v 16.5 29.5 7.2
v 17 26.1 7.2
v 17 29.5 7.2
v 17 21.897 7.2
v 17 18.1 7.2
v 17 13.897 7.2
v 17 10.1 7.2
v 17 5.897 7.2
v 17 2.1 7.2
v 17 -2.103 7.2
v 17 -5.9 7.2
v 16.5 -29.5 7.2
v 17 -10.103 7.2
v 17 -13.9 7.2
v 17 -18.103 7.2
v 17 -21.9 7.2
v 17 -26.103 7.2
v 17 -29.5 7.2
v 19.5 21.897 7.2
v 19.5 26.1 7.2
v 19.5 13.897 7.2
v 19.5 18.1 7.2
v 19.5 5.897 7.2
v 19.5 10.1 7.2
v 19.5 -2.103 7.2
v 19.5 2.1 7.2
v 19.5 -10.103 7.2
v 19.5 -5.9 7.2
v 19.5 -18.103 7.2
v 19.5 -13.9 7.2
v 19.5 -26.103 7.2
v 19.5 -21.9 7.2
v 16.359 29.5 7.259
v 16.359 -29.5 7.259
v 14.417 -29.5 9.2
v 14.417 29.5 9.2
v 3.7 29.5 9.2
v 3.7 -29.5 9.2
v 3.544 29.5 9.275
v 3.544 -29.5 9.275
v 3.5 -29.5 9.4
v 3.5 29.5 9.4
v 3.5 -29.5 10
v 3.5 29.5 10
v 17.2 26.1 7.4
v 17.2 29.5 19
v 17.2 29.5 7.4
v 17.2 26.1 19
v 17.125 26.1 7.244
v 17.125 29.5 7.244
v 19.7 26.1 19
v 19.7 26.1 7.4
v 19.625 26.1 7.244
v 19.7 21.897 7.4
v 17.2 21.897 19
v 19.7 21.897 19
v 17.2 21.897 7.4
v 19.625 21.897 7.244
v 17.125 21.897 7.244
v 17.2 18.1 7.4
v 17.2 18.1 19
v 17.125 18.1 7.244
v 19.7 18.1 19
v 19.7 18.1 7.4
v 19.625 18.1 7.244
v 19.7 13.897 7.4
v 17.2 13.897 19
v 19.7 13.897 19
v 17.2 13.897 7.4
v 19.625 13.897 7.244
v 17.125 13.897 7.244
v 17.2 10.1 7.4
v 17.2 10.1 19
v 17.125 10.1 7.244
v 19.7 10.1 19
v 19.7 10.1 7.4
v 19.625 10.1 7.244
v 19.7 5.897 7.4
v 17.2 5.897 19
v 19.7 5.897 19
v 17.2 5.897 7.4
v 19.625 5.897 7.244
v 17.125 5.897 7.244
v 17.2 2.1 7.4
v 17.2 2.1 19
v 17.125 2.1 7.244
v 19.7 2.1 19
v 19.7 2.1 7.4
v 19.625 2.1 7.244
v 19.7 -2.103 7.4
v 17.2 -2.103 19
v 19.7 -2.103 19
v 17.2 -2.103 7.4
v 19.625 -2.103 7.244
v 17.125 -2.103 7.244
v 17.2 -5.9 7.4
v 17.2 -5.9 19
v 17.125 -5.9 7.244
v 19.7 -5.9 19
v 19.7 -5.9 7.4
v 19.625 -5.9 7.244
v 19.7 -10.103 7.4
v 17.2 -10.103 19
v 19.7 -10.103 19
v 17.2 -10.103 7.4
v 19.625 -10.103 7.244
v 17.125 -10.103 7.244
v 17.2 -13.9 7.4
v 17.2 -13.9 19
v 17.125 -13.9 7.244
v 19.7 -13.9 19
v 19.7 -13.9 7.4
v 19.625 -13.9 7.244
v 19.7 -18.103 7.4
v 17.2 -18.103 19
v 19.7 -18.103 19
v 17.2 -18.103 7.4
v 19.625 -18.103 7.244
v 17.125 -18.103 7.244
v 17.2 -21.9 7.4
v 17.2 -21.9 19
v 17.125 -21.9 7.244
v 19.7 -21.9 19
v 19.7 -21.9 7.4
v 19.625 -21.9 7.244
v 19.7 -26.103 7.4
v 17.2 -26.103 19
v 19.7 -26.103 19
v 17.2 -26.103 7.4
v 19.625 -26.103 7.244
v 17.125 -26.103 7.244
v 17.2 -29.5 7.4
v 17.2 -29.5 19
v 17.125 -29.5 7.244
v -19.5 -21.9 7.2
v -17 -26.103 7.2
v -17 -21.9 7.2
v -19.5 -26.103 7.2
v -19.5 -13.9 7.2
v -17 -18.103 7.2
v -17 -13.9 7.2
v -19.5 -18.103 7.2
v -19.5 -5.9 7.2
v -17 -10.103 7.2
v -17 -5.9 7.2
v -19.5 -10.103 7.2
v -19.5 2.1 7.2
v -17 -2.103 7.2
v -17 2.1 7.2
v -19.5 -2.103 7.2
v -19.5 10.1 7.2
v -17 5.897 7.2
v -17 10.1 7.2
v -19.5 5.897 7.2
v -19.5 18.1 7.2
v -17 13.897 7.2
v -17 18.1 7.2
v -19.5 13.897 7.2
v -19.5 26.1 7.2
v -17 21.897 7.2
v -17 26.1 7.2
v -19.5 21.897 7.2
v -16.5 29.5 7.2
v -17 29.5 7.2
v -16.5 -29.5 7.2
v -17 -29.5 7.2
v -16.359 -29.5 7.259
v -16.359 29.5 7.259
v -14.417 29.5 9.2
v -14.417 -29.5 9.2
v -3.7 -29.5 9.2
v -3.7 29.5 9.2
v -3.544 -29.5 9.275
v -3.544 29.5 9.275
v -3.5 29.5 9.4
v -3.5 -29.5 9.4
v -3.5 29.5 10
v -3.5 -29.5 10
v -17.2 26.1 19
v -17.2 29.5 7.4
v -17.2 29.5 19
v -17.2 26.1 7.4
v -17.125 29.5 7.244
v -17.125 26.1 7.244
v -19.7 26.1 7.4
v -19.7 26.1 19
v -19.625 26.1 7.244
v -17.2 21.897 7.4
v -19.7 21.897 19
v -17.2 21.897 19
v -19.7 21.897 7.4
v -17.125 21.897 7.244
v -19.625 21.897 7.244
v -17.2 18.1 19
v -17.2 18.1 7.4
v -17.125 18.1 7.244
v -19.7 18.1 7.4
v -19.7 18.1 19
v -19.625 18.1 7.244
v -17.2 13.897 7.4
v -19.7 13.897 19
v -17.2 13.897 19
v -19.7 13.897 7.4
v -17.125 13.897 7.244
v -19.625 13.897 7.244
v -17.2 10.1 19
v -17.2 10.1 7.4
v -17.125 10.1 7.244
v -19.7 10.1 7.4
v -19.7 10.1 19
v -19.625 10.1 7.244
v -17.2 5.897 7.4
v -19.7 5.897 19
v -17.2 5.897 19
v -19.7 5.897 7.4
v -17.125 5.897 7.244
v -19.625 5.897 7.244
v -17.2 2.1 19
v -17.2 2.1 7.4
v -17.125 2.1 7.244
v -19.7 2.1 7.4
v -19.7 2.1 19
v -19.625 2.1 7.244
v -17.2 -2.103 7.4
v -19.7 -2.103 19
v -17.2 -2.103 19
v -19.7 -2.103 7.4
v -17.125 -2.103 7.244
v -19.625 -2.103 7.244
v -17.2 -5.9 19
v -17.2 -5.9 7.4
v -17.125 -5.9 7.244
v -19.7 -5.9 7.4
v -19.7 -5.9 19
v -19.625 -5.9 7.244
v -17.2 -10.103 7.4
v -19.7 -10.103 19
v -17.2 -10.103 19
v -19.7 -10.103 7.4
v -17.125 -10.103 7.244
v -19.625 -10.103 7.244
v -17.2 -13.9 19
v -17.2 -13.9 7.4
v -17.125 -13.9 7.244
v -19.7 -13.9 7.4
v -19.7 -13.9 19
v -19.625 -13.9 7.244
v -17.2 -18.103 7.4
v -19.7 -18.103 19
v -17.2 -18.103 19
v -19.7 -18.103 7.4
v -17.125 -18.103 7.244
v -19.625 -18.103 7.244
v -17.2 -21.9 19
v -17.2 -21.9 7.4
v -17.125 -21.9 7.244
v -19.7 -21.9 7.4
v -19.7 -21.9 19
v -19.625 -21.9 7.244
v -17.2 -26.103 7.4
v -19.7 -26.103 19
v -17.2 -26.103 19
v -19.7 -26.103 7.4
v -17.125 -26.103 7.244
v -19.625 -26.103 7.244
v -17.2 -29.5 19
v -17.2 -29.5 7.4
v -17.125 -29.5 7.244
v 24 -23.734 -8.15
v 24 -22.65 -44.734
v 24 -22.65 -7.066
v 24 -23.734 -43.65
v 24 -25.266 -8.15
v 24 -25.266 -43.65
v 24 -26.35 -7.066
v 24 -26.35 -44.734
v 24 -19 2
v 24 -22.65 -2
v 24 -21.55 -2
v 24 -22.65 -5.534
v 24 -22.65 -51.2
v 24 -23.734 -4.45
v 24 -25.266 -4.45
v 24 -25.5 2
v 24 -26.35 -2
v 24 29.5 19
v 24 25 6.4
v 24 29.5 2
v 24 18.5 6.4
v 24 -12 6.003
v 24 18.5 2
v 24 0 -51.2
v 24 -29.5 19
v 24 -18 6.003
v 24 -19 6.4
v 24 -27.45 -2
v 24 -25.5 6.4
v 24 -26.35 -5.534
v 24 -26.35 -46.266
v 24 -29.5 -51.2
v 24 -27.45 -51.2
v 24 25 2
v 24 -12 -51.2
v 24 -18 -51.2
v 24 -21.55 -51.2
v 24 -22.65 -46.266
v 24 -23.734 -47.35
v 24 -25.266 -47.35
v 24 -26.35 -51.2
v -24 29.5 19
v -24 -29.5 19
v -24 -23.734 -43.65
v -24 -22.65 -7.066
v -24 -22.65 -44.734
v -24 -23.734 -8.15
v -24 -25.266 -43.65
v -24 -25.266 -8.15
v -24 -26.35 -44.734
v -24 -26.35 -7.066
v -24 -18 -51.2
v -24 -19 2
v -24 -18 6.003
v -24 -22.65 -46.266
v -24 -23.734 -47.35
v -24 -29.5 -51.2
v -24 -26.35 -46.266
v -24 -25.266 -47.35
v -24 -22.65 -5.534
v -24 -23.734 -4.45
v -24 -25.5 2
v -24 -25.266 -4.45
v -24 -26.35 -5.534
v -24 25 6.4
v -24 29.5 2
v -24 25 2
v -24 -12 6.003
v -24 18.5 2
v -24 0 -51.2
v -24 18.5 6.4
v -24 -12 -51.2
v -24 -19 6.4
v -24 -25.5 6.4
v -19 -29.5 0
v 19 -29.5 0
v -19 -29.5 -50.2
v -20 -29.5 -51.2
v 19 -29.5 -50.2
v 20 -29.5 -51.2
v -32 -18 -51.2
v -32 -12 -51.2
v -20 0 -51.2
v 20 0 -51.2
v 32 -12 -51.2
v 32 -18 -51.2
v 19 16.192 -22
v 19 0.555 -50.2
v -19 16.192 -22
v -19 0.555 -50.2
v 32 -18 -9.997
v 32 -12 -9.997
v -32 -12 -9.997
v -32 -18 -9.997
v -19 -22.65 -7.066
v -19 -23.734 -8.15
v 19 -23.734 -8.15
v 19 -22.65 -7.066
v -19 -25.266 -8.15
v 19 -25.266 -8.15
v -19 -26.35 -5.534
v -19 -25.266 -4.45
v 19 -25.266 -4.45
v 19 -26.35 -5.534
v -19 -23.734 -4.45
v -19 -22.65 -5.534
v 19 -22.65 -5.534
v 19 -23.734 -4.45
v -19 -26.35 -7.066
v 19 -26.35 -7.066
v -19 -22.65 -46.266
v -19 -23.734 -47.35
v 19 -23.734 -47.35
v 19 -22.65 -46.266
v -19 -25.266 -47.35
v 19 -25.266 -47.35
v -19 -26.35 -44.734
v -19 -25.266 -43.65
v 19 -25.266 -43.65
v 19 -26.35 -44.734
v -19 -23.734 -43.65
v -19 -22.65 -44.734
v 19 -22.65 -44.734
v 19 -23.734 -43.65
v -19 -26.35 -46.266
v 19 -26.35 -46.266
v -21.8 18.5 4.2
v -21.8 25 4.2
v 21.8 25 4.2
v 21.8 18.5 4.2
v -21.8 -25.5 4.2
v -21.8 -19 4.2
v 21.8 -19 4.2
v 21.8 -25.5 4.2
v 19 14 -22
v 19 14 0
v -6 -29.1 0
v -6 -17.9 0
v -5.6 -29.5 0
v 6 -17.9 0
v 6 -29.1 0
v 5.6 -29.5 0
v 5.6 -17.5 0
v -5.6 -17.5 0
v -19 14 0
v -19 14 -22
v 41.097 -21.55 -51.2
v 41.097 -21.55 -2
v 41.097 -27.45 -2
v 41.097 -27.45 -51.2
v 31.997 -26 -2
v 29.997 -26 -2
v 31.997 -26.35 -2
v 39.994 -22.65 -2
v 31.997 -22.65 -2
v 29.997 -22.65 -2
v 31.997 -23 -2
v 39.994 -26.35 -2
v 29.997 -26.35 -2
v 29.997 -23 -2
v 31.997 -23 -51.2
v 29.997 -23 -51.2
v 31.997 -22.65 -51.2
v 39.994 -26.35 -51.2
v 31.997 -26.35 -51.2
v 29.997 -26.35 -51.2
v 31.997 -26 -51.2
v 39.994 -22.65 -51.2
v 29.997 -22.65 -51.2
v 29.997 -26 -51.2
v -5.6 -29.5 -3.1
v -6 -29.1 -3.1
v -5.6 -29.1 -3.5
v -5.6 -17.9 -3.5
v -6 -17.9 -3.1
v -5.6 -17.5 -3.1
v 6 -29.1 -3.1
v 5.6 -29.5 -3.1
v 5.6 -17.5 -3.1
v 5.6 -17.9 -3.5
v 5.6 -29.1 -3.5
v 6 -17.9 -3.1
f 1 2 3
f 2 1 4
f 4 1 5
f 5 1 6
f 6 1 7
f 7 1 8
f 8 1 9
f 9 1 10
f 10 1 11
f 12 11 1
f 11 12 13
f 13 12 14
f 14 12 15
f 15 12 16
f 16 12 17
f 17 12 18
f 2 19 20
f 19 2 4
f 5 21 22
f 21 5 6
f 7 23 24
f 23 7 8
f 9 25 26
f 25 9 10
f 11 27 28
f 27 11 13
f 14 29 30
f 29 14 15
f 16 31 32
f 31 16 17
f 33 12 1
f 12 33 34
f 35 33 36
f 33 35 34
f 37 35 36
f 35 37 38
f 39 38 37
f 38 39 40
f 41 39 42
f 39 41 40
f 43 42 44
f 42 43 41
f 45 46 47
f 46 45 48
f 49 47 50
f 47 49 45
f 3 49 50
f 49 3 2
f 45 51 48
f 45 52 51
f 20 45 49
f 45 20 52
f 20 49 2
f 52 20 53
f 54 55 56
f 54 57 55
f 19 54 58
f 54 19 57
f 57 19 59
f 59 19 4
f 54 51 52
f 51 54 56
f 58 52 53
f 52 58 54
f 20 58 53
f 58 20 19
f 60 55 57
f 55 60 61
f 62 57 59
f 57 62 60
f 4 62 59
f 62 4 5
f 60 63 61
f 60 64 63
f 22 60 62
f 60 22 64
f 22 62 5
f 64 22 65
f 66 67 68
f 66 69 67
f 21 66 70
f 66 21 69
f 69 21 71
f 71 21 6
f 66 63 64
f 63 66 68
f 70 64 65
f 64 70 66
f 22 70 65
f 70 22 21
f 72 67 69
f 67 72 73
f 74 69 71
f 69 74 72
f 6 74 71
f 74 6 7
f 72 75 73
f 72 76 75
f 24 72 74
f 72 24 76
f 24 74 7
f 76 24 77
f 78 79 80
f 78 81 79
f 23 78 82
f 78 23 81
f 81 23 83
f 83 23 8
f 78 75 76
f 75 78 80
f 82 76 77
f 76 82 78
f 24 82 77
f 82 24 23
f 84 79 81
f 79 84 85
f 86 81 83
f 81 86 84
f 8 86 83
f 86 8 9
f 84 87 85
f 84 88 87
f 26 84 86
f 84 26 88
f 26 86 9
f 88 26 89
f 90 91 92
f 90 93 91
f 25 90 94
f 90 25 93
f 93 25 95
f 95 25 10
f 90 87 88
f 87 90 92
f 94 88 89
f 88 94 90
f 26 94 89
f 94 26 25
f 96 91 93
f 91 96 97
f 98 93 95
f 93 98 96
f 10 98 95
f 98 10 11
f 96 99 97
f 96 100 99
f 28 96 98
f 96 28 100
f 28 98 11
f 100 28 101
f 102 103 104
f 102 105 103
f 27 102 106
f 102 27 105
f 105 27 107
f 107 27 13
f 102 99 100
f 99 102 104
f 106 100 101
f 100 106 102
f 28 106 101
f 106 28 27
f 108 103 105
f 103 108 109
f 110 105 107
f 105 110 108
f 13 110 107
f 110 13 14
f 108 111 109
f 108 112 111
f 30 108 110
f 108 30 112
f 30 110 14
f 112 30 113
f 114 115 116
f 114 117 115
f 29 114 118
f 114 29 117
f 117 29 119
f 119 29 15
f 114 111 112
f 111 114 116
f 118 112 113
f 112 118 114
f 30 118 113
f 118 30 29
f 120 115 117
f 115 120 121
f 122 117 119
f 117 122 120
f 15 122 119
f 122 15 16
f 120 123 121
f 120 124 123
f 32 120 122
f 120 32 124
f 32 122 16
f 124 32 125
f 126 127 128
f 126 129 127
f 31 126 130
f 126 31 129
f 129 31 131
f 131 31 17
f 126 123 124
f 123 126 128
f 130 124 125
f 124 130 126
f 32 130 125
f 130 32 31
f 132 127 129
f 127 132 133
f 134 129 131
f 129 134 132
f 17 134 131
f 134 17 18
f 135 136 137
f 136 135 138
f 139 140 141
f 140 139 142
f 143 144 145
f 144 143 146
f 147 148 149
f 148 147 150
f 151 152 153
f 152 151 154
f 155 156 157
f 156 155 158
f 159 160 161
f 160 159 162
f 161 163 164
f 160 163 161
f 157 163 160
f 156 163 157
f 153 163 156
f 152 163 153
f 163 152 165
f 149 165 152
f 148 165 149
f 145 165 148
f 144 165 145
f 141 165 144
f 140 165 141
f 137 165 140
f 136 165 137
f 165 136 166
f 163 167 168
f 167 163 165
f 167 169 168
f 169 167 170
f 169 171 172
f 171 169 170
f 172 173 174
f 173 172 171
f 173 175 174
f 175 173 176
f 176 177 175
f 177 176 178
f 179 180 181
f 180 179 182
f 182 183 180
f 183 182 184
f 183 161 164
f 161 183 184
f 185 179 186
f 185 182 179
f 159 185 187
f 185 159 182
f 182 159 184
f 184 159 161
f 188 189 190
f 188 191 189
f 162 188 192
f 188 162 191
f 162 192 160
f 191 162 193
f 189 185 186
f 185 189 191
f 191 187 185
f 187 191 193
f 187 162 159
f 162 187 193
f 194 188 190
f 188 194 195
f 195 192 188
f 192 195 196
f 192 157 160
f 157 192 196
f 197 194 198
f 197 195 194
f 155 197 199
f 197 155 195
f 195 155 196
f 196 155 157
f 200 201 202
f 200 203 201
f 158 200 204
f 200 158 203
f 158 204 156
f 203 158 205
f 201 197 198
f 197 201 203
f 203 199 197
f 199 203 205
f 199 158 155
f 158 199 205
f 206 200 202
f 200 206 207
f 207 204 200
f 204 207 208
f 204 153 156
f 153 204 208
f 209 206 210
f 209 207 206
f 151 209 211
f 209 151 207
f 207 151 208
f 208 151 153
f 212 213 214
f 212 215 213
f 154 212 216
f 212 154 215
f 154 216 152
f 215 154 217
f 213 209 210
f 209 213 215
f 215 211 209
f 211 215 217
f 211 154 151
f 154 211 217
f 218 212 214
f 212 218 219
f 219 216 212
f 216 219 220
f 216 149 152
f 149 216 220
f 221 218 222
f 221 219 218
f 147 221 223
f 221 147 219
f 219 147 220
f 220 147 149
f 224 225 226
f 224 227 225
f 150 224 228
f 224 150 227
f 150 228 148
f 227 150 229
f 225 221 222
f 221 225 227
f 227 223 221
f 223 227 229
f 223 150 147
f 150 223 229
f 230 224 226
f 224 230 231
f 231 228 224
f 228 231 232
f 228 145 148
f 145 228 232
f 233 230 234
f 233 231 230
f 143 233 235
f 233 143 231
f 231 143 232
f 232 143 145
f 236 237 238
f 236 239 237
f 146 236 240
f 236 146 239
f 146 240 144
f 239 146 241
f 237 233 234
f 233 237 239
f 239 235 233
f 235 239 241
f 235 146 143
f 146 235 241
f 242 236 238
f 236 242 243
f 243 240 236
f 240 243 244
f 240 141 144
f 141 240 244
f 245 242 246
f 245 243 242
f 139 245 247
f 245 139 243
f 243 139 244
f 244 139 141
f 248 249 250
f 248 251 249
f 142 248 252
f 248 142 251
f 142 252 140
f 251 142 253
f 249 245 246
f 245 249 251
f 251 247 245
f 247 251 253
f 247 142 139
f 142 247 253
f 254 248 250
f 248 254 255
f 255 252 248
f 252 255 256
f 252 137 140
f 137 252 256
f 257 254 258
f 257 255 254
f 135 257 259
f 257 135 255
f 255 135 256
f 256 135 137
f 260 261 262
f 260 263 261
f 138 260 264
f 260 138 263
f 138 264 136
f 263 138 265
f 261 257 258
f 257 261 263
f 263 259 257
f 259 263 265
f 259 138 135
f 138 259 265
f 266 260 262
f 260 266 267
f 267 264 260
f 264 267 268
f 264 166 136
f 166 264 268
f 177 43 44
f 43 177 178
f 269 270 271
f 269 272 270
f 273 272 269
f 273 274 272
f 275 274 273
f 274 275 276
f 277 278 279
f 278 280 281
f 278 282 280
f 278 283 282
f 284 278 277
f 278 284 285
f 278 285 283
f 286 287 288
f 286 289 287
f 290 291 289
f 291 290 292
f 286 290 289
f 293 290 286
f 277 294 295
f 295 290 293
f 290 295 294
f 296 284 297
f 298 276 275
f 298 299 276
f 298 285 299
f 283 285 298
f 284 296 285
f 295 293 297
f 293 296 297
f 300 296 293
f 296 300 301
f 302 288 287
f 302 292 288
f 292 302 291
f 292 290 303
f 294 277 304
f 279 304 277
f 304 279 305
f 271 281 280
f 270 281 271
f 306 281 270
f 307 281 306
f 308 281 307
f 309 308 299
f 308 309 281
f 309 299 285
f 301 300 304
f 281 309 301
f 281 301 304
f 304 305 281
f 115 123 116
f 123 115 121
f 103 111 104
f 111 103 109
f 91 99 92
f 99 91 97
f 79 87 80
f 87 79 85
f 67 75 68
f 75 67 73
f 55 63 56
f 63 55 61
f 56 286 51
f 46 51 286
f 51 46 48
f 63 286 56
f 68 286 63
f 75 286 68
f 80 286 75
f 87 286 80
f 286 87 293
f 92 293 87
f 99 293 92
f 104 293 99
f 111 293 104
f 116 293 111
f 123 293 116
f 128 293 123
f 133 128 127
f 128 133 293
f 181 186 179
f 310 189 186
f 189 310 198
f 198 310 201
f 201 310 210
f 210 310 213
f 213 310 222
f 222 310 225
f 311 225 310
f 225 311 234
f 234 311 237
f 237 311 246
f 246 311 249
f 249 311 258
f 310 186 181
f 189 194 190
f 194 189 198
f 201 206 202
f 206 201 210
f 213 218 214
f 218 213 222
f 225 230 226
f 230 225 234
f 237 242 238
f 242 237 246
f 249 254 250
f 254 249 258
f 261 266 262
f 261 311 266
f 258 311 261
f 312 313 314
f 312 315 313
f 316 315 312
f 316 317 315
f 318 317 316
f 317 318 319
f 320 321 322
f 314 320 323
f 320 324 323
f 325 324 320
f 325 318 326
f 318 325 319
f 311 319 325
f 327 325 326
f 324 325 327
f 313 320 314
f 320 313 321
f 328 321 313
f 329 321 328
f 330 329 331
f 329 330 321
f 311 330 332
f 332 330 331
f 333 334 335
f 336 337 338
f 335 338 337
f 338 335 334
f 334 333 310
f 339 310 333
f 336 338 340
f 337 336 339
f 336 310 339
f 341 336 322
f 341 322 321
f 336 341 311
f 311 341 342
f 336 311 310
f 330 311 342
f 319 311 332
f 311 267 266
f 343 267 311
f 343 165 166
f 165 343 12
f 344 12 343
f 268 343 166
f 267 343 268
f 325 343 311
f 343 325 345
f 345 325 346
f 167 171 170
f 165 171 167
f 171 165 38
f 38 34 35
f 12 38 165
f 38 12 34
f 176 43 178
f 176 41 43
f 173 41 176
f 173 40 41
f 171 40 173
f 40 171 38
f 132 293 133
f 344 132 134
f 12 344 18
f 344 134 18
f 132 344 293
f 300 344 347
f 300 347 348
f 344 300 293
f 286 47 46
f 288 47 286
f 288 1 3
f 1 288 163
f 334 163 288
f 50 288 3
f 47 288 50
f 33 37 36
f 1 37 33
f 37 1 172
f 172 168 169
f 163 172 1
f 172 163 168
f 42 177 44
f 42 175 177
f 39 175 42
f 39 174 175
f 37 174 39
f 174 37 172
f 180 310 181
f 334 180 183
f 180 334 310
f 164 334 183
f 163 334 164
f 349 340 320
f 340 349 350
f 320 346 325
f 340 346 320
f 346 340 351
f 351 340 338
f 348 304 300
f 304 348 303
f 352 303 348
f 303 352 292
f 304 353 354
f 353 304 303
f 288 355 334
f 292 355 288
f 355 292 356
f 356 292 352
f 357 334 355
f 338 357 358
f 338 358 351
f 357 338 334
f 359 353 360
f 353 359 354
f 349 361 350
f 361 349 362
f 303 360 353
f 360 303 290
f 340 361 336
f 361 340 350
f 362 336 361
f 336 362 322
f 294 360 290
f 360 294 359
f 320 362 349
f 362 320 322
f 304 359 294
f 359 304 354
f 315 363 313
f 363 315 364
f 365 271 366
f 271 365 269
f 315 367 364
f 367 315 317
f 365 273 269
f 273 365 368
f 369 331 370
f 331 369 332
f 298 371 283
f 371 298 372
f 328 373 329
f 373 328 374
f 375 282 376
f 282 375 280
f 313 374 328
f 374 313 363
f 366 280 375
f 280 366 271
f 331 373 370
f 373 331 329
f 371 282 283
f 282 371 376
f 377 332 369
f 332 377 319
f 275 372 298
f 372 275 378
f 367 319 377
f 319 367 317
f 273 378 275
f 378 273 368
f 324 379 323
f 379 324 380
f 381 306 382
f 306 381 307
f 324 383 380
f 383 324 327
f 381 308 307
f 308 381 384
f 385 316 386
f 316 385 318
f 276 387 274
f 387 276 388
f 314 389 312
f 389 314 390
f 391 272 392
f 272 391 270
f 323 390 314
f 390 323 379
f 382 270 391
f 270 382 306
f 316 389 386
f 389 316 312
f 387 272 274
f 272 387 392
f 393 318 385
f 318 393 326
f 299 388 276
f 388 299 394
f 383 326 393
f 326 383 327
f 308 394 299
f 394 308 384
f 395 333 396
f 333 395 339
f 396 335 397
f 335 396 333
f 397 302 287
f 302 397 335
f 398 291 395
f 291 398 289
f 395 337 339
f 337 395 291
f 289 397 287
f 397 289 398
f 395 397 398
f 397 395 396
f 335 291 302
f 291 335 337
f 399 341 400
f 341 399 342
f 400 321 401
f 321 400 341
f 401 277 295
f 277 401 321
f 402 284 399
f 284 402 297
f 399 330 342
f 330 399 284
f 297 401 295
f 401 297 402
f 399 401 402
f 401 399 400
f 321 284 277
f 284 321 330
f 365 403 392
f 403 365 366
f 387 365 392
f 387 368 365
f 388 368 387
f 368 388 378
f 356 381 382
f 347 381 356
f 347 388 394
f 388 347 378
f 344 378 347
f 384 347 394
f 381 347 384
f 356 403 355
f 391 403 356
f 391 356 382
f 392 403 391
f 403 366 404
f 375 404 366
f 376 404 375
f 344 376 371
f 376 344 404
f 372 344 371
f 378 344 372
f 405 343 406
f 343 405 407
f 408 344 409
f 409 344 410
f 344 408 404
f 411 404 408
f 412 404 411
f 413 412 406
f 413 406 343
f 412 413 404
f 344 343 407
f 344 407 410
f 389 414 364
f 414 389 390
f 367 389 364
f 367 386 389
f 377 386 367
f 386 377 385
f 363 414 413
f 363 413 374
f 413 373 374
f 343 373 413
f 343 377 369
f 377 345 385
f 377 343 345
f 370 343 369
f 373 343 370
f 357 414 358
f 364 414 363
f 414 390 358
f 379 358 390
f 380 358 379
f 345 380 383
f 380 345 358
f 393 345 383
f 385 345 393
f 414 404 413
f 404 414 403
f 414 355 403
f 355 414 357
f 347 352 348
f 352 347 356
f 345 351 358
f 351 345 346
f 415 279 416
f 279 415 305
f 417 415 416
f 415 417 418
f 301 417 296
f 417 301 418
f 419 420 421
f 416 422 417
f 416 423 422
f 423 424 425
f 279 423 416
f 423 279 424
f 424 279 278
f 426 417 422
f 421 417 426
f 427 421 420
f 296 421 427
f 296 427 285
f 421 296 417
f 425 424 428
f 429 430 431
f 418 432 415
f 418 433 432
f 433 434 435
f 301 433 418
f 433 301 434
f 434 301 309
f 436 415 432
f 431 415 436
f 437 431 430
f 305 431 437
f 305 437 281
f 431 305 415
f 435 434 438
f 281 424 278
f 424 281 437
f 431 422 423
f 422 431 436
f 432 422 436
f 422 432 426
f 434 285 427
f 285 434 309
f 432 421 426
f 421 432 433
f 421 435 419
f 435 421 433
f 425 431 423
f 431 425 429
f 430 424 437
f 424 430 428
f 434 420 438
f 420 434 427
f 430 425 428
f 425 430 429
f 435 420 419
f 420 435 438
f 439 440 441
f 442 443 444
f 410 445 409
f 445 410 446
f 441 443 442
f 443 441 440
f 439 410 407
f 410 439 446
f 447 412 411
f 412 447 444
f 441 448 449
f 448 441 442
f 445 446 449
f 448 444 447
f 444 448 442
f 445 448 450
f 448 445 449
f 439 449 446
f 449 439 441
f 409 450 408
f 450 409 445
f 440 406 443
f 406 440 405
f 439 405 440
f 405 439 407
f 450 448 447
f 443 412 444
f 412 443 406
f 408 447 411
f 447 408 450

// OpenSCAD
// file: rail.scad
include <common.scad>

rail_notch_depth = 2.5;
rail_notch_length = 4;

// lug_type:
//   0 means no lug.
//   -1 means no lug and slightly recessed further.
//   1 means beveled.
//   2 means square.
module rail_2d(width, stem, lug_type) {
  translate([0, -stem/2 - 0.2, 0])
    square([width, stem - 0.4], center=true);
  
  difference() {
    hull()
      for (a = [-1, 1])
        scale([a, 1, 1])
          translate([width/2, 0, 0])
            rotate([0, 0, 45])
              square(rail_notch_depth*sqrt(2), center=true);
    
    // Square off the ends, to avoid sharp corners.
    for (a = [-1, 1])
      scale([a, 1, 1])
        translate([width/2 + rail_notch_depth, 0, 0])
          square(1, center=true);

    if (lug_type <= 0)
      translate([0, rail_notch_depth - (lug_type == -1 ? 0.4 : 0)])
        square([width+rail_notch_depth*4, rail_notch_depth*2], center=true);
  }
  
  if (lug_type == 2)
    translate([0, rail_notch_depth/2, 0])
      square([width + rail_notch_depth*2 - 1, rail_notch_depth], center=true);
}

module rail(width, length, stem, cavity=false) {
  repeats = floor(length / (2*rail_notch_length));
  
  intersection() {
    // Cut to just the desired length.
    cube([width+20, stem+20, length*2], center=true);
    
    for (a = [0:repeats]) {
      translate([0, 0, a*2*rail_notch_length]) {
        difference() {
          // High piece.
          translate([0, 0, cavity ? -snug/2 : 0])
            linear_extrude(rail_notch_length+eps + (cavity ? snug : 0))
              offset(cavity ? snug : 0)
                rail_2d(width, stem, cavity ? 2 : 1);

          // Chamfer edges.
          if (!cavity)
            for (z = [0, rail_notch_length])
              translate([0, rail_notch_depth, z])
                hull()
                  rotate([45, 0, 0])
                    cube(
                      [width*2, foot*sqrt(2), foot*sqrt(2)],
                      center=true
                    );
        }

        // Low piece.
        translate([0, 0, rail_notch_length])
          linear_extrude(rail_notch_length+eps)
            offset(cavity ? snug : 0)
              // When not cutting out a cavity, recess the low piece a bit
              // to make up for printing inaccuracies while bridging.
              rail_2d(width, stem, cavity ? 0 : -1);      
      }
    }
  }
}
// file: block.scad
include <barrel.scad>
include <common.scad>

block_height = barrel_height + 14;
block_width = barrel_width/2 + 7;

module block(length) {
  translate([0, 0, block_width]) {
    rotate([180, 0, 0]) {
      difference() {
        translate([-block_height/2, -length/2, 0])
          cube([block_height, length, block_width]);
        
        barrel_cutout();
      }
    }
  }
}

zip_tie_width = 6;

module zip_tie_aids() {
  // Slot for zip tie.
  translate([0, 0, block_width*1.35]) {
    rotate([90, 0, 0]) {
      translate([0, 0, -zip_tie_width/2]) {
        linear_extrude(zip_tie_width) {
          $fa = 4;
          difference() {
            circle(d=2*block_height);
            circle(d=block_height*1.25);
          }
        }
      }
    }
  }
  
  // Slot to make it easy to cut the zip tie.
  cube([5, 10, 4], center=true);
}
// file: barrel.scad
include <common.scad>
include <rail.scad>

// Should be wide enough to accommodate whatever bore structure we
// want.
barrel_width = 20;
barrel_height = 34;

barrel_length = 244;
// See results from bore_test.scad.
main_bore = 13.8;

// Something this tall will fit in the barrel gap.
barrel_gap = 7.4;

barrel_gap_intrusion = 1;

module barrel() {
  // Make the bore with high precision.
  $fa = 5;
  
  difference() {
    translate([0, barrel_height/2, 0])
      rail(barrel_width, barrel_length, barrel_height/2 - barrel_gap/2);
    
    translate([0, 0, -eps])
      cylinder(barrel_length+2*eps, d=main_bore);
  }
  
  // Brims to prevent warping.
  for (z = [-7 + 0.2, barrel_length - 0.2])
    translate([-barrel_width/2, -0.2 + barrel_height/2 + rail_notch_depth, z])
      cube([barrel_width, 0.2, 7]);
}

// The barrel needs a particular orientation on the build plate.
module barrel_print() {
  // This particular orientation ensures that the first bridging layer goes
  // the short way across the gaps, instead of the long way.
  rotate([-90, 0, -45])
    barrel();
}

// Volume to remove from a piece which is intended to mate with the barrel.
module barrel_cutout() {
  for (a = [-1, 1])
    scale([a, 1, 1])
      translate([-barrel_height/2, -barrel_length/2, 0])
        rotate([0, 90, 90])
          // Decrease the width by 0.8. This ensures that pieces which clasp the
          // barrel rails don't quite meet each other in the middle, so they
          // keep good pressure on the barrel rails.
          rail(barrel_width-0.8, barrel_length, barrel_height/2 - barrel_gap/2, cavity=true);
  
  // Only allow the piece to intrude 1mm into the barrel gap. This is enough to keep the
  // barrel pieces properly spaced.
  cube([barrel_gap + eps, barrel_length, barrel_width - 2*barrel_gap_intrusion], center=true);
}
// file: common.scad
$fa = 10;
$fs = 0.2;
eps = 0.003;
$zstep = 0.2;

// An inward chamfer sufficient to prevent elephant's foot.
foot = 0.4;

// FINDINGS FROM CLEARANCE TEST
//
// Consider a vertical hole of width X, a layer height of 0.2, and a vertical
// post.
//   * A post of diameter X will not fit in.
//   * A post of diameter X-0.1 will fit in, but is very hard to slide in or out.
//     This is probably due mostly to the transverse grain of the print.
//     It will rotate, but with some resistance.
//   * A post of diameter X-0.2 slides in and out easily. It rotates easily, but
//     still has noticeable resistance at some points.
//   * A post of diameter X-0.3 rotates freely. It also has noticeable play
//     from side to side.
//
// Clearances are expressed as the total across both sides of a joint.
tight = 0.1;  // Intended for stationary joints.
snug = 0.2;   // Moves, but with some resistance.
loose = 0.3;  // Free movement.
extra_loose = 0.4;

// A brim is a 0.2mm layer printed near an edge which is likely to warp.
// The edge should be chamfered outwards at 45 degrees. The brim should
// be placed this far from the bottom of the edge, so it barely touches
// the chamfer.
brim_offset = 0.3;

// Menards 5/8 x 2-3/4 x 0.04 WG compression spring.
spring_od = 5/8 * 25.4;
// Subtract 10 from the relaxed length so everything is slightly tensioned
// all the time.
spring_max_length = 2.75 * 25.4 - 10;
spring_min_length = 16;  // Approximate.

// Menards 1/4 inch aluminum rod.
roller_diameter = 6.7;
roller_cavity_diameter = roller_diameter + loose;

// 550 paracord. Make this wide enough to accommodate a melted end.
string_diameter = 4.5;

// Standard spring tube.
tube_id = spring_od + 0.7;

module octagon(diameter) {
  intersection_for(a = [0, 45])
    rotate([0, 0, a])
      square(diameter, center=true);
}

// A cylinder with chamfered or flared ends, useful for dealing with
// elephant's foot on pins or holes.
module flare_cylinder(height, radius, flare_top, flare_bottom) {
  translate([0, 0, abs(flare_bottom)-eps])
    cylinder(height-abs(flare_bottom)-abs(flare_top)+eps, radius, radius);

  // Bottom flare.
  linear_extrude(abs(flare_bottom), scale=radius/(radius-flare_bottom))
    circle(radius-flare_bottom);
  
  // Top flare.
  translate([0, 0, height-abs(flare_top)])
    linear_extrude(abs(flare_top), scale=(radius-flare_top)/radius)
      circle(radius);
}

// A cube with a chamfered or flared bottom end, useful for dealing
// with elephant's foot on pins or holes.
module flare_cube(dims, flare) {
  translate([0, 0, abs(flare)-eps])
    cube([dims.x, dims.y, dims.z - abs(flare) + eps]);

  translate([dims.x/2, dims.y/2, 0])
    linear_extrude(abs(flare), scale=[dims.x/(dims.x-2*flare), dims.y/(dims.y-2*flare)])
      translate([-(dims.x-2*flare)/2, -(dims.y-2*flare)/2, abs(flare)-eps])
        square([dims.x-2*flare, dims.y-2*flare]);
}

// An approximate circle which can be printed on its side.
module circle_ish(r) {
  // Safe overhang angle.
  q = 45;
  
  intersection() {
    // Add 0.2 (one print layer) in case the bridge is messy and hangs
    // down.
    square(2*r+0.2, center=true);
    hull() {
      circle(r);
      for (a = [-1, 1])
        translate([0, a*r/cos(q), 0])
          square(eps, center=true);
    }
  }
}

// Depth of the sockets used as glue aids.
socket_depth = 5;

module socket() {
  translate([-1.5, -1.5, -eps])
    flare_cube([3, 3, socket_depth], -foot);
}

module lug() {
  flare_cube([3-snug, 3-snug, 2*socket_depth-2], foot);
}

// Nerf darts are 0.50 cal.
dart_diameter = 12.7;
dart_length = 72;

module octahedron(major_radius=1) {
  // Top and bottom halves.
  for (a = [-1, 1])
    scale([1, 1, a])
      // Extrude a square into a pyramid.
      linear_extrude(major_radius, scale=0)
        rotate([0, 0, 45])
          square(sqrt(2)*major_radius, center=true);
}

module chamfered_cube(dims, chamfer=1) {
  assert(dims.x >= 2*chamfer);
  assert(dims.y >= 2*chamfer);
  assert(dims.z >= 2*chamfer);

  hull()
    for (a = [0, 1], b = [0, 1], c = [0, 1])
        translate([
          (dims.x - 2*chamfer) * a + chamfer,
          (dims.y - 2*chamfer) * b + chamfer,
          (dims.z - 2*chamfer) * c + chamfer
        ])
          octahedron(chamfer);
}
// main file
include <common.scad>
include <barrel.scad>
include <block.scad>

nail_diameter = 3.3;
nail_loose_diameter = 3.7;
nail_snug_diameter = 3.6;

socket_diameter = 7;
spring_height = 12;
spring_hub_diameter = 15;
spring_thickness = 3;
spring_gap = 3;
spring_turns = 5;

spring_handle_id = nail_loose_diameter;
spring_handle_od = spring_handle_id + 2*spring_thickness;

module hairspring_2d(foot=0) {
  start_radius = spring_hub_diameter/2 - spring_thickness/2;
  slope = spring_thickness + spring_gap;
  
  difference() {
    union() {
      circle(d=spring_hub_diameter);
      spiral(start_radius, slope, spring_turns, spring_thickness-2*foot);
    }

    // Square off the loose end.
    rotate([0, 0, spring_turns*360])
      translate([start_radius + slope*spring_turns, spring_thickness/2 + spring_gap/2])
        square(spring_thickness + spring_gap, center=true);
  }
  
  // Add a handle on the end, as requested by the caller.
  handle_id = nail_loose_diameter;
  handle_od = handle_id + 2*spring_thickness;
  
  rotate([0, 0, spring_turns*360]) {
    translate([start_radius + slope*spring_turns + handle_od/2 - spring_thickness/2, 0]) {
      difference() {
        circle(d=handle_od - 2*foot);
        circle(d=handle_id + 2*foot);
      }
    }
  }
}

// The distance between the centers of the two holes.
spring_hole_spacing =
  spring_hub_diameter/2 + spring_thickness/2 + (spring_thickness + spring_gap) * spring_turns + snug;

cam_thickness = 12;

bracket_plate_thickness = 5;
bracket_length = 59;
spring_cavity_height = spring_height*2 + cam_thickness + 2;

pin_hole_y = -bracket_length/2 + 5;
pin_hole_z = -nail_diameter - spring_thickness;

module bracket() {
  body_width = spring_hole_spacing + 12;

  // Needs to be long enough to support the part during printing.
  tip_length = bracket_length/2;
  
  rib_thickness = 6;
  rib_height = 8;
    
  difference() {
    union() {
      // Block which adapts to rail.
      translate([0, 0, 2])
        block(bracket_length);
            
      // Body.
      hull() {
        translate([0, 0, 2])
          linear_extrude(eps)
            square([block_height, bracket_length], center=true);
        translate([0, tip_length/2-bracket_length/2, -body_width])
          linear_extrude(eps)
            square([block_height, tip_length], center=true);
      }
      
      // Reinforcing rib, to keep everything aligned during printing.
      translate([0, -15, 0]) {
        hull() {
          translate([0, 0, 6])
            linear_extrude(eps)
              square([block_height, rib_thickness], center=true);
          translate([0, 0, -10])
            linear_extrude(eps)
              square([block_height+2*rib_height, rib_thickness], center=true);
          translate([0, 0, -body_width])
            linear_extrude(eps)
              square([block_height+2*rib_height, rib_thickness], center=true);
        }
      }
    }
    
    // Pin holes.
    for (z = [pin_hole_z, pin_hole_z-spring_hole_spacing])
      translate([0, pin_hole_y, z])
        rotate([0, 90, 0])
          translate([0, 0, -block_height/2-2])
            linear_extrude(block_height+4)
              octagon(nail_loose_diameter);
        
    // Main spring cavity. It is composed of two blocks to leave a bridge between
    // the plates in front.
    translate([-spring_cavity_height/2, -50, -100])
      cube([spring_cavity_height, 64, 100]);
    translate([-spring_cavity_height/2, -50, -122])
      cube([spring_cavity_height, 100, 100]);
        
    // Avoid elephant foot inside the cavity.
    chamfer_side = (spring_cavity_height+2)/sqrt(2);
    translate([0, 0, -body_width])
      rotate([0, 45, 0])
        cube([chamfer_side, 100, chamfer_side], center=true);

    // Zip tie channels.
    channel_height = 2.2;
    channel_width = 6.5;
    for (y = [bracket_length/2-11, 4-bracket_length/2]) {
      translate([0, y, 2]) {
        translate([-50, 0, 0])
          cube([100, channel_width, channel_height]);
        for (b = [-1, 1])
          scale([b, 1, 1])
            translate([block_height/2 - channel_height, 0, channel_height])
              rotate([0, 45, 0])
                cube(channel_width);
      }
    }
  }
  
  // Block to keep springs separated.
  translate([-cam_thickness/2, -bracket_length/2, -0.5-spring_thickness])
    chamfered_cube([cam_thickness, 4*spring_thickness, spring_thickness+2], 0.4);
  
  // Nail paddles next to pin holes.
  translate([block_height/2-eps, pin_hole_y, -body_width/2-1])
    rotate([90, 0, 90])
      nail_paddles(body_width-2);
}

// Flexible paddles which press against the tip of the nail and keep it in place.
module nail_paddles(width) {
  thickness = 1.1;
  height = 16 + thickness;
  
  // Inset (on each side) to grip the nail.
  inset = 0.35;
  
  difference() {
    translate([0, 0, height/2])
      cube([nail_loose_diameter+thickness*2, width, height], center=true);
    translate([0, 0, (height-thickness)/2-eps])
      cube([nail_loose_diameter, width+1, height-thickness], center=true);
  }
  
  translate([0, 0, (height-thickness)/2 - 1]) {
    difference() {
      cube([nail_loose_diameter, width, 2], center=true);
      cube([nail_loose_diameter-inset*2, width+1, 3], center=true);
    }
  }
}

bracket();
